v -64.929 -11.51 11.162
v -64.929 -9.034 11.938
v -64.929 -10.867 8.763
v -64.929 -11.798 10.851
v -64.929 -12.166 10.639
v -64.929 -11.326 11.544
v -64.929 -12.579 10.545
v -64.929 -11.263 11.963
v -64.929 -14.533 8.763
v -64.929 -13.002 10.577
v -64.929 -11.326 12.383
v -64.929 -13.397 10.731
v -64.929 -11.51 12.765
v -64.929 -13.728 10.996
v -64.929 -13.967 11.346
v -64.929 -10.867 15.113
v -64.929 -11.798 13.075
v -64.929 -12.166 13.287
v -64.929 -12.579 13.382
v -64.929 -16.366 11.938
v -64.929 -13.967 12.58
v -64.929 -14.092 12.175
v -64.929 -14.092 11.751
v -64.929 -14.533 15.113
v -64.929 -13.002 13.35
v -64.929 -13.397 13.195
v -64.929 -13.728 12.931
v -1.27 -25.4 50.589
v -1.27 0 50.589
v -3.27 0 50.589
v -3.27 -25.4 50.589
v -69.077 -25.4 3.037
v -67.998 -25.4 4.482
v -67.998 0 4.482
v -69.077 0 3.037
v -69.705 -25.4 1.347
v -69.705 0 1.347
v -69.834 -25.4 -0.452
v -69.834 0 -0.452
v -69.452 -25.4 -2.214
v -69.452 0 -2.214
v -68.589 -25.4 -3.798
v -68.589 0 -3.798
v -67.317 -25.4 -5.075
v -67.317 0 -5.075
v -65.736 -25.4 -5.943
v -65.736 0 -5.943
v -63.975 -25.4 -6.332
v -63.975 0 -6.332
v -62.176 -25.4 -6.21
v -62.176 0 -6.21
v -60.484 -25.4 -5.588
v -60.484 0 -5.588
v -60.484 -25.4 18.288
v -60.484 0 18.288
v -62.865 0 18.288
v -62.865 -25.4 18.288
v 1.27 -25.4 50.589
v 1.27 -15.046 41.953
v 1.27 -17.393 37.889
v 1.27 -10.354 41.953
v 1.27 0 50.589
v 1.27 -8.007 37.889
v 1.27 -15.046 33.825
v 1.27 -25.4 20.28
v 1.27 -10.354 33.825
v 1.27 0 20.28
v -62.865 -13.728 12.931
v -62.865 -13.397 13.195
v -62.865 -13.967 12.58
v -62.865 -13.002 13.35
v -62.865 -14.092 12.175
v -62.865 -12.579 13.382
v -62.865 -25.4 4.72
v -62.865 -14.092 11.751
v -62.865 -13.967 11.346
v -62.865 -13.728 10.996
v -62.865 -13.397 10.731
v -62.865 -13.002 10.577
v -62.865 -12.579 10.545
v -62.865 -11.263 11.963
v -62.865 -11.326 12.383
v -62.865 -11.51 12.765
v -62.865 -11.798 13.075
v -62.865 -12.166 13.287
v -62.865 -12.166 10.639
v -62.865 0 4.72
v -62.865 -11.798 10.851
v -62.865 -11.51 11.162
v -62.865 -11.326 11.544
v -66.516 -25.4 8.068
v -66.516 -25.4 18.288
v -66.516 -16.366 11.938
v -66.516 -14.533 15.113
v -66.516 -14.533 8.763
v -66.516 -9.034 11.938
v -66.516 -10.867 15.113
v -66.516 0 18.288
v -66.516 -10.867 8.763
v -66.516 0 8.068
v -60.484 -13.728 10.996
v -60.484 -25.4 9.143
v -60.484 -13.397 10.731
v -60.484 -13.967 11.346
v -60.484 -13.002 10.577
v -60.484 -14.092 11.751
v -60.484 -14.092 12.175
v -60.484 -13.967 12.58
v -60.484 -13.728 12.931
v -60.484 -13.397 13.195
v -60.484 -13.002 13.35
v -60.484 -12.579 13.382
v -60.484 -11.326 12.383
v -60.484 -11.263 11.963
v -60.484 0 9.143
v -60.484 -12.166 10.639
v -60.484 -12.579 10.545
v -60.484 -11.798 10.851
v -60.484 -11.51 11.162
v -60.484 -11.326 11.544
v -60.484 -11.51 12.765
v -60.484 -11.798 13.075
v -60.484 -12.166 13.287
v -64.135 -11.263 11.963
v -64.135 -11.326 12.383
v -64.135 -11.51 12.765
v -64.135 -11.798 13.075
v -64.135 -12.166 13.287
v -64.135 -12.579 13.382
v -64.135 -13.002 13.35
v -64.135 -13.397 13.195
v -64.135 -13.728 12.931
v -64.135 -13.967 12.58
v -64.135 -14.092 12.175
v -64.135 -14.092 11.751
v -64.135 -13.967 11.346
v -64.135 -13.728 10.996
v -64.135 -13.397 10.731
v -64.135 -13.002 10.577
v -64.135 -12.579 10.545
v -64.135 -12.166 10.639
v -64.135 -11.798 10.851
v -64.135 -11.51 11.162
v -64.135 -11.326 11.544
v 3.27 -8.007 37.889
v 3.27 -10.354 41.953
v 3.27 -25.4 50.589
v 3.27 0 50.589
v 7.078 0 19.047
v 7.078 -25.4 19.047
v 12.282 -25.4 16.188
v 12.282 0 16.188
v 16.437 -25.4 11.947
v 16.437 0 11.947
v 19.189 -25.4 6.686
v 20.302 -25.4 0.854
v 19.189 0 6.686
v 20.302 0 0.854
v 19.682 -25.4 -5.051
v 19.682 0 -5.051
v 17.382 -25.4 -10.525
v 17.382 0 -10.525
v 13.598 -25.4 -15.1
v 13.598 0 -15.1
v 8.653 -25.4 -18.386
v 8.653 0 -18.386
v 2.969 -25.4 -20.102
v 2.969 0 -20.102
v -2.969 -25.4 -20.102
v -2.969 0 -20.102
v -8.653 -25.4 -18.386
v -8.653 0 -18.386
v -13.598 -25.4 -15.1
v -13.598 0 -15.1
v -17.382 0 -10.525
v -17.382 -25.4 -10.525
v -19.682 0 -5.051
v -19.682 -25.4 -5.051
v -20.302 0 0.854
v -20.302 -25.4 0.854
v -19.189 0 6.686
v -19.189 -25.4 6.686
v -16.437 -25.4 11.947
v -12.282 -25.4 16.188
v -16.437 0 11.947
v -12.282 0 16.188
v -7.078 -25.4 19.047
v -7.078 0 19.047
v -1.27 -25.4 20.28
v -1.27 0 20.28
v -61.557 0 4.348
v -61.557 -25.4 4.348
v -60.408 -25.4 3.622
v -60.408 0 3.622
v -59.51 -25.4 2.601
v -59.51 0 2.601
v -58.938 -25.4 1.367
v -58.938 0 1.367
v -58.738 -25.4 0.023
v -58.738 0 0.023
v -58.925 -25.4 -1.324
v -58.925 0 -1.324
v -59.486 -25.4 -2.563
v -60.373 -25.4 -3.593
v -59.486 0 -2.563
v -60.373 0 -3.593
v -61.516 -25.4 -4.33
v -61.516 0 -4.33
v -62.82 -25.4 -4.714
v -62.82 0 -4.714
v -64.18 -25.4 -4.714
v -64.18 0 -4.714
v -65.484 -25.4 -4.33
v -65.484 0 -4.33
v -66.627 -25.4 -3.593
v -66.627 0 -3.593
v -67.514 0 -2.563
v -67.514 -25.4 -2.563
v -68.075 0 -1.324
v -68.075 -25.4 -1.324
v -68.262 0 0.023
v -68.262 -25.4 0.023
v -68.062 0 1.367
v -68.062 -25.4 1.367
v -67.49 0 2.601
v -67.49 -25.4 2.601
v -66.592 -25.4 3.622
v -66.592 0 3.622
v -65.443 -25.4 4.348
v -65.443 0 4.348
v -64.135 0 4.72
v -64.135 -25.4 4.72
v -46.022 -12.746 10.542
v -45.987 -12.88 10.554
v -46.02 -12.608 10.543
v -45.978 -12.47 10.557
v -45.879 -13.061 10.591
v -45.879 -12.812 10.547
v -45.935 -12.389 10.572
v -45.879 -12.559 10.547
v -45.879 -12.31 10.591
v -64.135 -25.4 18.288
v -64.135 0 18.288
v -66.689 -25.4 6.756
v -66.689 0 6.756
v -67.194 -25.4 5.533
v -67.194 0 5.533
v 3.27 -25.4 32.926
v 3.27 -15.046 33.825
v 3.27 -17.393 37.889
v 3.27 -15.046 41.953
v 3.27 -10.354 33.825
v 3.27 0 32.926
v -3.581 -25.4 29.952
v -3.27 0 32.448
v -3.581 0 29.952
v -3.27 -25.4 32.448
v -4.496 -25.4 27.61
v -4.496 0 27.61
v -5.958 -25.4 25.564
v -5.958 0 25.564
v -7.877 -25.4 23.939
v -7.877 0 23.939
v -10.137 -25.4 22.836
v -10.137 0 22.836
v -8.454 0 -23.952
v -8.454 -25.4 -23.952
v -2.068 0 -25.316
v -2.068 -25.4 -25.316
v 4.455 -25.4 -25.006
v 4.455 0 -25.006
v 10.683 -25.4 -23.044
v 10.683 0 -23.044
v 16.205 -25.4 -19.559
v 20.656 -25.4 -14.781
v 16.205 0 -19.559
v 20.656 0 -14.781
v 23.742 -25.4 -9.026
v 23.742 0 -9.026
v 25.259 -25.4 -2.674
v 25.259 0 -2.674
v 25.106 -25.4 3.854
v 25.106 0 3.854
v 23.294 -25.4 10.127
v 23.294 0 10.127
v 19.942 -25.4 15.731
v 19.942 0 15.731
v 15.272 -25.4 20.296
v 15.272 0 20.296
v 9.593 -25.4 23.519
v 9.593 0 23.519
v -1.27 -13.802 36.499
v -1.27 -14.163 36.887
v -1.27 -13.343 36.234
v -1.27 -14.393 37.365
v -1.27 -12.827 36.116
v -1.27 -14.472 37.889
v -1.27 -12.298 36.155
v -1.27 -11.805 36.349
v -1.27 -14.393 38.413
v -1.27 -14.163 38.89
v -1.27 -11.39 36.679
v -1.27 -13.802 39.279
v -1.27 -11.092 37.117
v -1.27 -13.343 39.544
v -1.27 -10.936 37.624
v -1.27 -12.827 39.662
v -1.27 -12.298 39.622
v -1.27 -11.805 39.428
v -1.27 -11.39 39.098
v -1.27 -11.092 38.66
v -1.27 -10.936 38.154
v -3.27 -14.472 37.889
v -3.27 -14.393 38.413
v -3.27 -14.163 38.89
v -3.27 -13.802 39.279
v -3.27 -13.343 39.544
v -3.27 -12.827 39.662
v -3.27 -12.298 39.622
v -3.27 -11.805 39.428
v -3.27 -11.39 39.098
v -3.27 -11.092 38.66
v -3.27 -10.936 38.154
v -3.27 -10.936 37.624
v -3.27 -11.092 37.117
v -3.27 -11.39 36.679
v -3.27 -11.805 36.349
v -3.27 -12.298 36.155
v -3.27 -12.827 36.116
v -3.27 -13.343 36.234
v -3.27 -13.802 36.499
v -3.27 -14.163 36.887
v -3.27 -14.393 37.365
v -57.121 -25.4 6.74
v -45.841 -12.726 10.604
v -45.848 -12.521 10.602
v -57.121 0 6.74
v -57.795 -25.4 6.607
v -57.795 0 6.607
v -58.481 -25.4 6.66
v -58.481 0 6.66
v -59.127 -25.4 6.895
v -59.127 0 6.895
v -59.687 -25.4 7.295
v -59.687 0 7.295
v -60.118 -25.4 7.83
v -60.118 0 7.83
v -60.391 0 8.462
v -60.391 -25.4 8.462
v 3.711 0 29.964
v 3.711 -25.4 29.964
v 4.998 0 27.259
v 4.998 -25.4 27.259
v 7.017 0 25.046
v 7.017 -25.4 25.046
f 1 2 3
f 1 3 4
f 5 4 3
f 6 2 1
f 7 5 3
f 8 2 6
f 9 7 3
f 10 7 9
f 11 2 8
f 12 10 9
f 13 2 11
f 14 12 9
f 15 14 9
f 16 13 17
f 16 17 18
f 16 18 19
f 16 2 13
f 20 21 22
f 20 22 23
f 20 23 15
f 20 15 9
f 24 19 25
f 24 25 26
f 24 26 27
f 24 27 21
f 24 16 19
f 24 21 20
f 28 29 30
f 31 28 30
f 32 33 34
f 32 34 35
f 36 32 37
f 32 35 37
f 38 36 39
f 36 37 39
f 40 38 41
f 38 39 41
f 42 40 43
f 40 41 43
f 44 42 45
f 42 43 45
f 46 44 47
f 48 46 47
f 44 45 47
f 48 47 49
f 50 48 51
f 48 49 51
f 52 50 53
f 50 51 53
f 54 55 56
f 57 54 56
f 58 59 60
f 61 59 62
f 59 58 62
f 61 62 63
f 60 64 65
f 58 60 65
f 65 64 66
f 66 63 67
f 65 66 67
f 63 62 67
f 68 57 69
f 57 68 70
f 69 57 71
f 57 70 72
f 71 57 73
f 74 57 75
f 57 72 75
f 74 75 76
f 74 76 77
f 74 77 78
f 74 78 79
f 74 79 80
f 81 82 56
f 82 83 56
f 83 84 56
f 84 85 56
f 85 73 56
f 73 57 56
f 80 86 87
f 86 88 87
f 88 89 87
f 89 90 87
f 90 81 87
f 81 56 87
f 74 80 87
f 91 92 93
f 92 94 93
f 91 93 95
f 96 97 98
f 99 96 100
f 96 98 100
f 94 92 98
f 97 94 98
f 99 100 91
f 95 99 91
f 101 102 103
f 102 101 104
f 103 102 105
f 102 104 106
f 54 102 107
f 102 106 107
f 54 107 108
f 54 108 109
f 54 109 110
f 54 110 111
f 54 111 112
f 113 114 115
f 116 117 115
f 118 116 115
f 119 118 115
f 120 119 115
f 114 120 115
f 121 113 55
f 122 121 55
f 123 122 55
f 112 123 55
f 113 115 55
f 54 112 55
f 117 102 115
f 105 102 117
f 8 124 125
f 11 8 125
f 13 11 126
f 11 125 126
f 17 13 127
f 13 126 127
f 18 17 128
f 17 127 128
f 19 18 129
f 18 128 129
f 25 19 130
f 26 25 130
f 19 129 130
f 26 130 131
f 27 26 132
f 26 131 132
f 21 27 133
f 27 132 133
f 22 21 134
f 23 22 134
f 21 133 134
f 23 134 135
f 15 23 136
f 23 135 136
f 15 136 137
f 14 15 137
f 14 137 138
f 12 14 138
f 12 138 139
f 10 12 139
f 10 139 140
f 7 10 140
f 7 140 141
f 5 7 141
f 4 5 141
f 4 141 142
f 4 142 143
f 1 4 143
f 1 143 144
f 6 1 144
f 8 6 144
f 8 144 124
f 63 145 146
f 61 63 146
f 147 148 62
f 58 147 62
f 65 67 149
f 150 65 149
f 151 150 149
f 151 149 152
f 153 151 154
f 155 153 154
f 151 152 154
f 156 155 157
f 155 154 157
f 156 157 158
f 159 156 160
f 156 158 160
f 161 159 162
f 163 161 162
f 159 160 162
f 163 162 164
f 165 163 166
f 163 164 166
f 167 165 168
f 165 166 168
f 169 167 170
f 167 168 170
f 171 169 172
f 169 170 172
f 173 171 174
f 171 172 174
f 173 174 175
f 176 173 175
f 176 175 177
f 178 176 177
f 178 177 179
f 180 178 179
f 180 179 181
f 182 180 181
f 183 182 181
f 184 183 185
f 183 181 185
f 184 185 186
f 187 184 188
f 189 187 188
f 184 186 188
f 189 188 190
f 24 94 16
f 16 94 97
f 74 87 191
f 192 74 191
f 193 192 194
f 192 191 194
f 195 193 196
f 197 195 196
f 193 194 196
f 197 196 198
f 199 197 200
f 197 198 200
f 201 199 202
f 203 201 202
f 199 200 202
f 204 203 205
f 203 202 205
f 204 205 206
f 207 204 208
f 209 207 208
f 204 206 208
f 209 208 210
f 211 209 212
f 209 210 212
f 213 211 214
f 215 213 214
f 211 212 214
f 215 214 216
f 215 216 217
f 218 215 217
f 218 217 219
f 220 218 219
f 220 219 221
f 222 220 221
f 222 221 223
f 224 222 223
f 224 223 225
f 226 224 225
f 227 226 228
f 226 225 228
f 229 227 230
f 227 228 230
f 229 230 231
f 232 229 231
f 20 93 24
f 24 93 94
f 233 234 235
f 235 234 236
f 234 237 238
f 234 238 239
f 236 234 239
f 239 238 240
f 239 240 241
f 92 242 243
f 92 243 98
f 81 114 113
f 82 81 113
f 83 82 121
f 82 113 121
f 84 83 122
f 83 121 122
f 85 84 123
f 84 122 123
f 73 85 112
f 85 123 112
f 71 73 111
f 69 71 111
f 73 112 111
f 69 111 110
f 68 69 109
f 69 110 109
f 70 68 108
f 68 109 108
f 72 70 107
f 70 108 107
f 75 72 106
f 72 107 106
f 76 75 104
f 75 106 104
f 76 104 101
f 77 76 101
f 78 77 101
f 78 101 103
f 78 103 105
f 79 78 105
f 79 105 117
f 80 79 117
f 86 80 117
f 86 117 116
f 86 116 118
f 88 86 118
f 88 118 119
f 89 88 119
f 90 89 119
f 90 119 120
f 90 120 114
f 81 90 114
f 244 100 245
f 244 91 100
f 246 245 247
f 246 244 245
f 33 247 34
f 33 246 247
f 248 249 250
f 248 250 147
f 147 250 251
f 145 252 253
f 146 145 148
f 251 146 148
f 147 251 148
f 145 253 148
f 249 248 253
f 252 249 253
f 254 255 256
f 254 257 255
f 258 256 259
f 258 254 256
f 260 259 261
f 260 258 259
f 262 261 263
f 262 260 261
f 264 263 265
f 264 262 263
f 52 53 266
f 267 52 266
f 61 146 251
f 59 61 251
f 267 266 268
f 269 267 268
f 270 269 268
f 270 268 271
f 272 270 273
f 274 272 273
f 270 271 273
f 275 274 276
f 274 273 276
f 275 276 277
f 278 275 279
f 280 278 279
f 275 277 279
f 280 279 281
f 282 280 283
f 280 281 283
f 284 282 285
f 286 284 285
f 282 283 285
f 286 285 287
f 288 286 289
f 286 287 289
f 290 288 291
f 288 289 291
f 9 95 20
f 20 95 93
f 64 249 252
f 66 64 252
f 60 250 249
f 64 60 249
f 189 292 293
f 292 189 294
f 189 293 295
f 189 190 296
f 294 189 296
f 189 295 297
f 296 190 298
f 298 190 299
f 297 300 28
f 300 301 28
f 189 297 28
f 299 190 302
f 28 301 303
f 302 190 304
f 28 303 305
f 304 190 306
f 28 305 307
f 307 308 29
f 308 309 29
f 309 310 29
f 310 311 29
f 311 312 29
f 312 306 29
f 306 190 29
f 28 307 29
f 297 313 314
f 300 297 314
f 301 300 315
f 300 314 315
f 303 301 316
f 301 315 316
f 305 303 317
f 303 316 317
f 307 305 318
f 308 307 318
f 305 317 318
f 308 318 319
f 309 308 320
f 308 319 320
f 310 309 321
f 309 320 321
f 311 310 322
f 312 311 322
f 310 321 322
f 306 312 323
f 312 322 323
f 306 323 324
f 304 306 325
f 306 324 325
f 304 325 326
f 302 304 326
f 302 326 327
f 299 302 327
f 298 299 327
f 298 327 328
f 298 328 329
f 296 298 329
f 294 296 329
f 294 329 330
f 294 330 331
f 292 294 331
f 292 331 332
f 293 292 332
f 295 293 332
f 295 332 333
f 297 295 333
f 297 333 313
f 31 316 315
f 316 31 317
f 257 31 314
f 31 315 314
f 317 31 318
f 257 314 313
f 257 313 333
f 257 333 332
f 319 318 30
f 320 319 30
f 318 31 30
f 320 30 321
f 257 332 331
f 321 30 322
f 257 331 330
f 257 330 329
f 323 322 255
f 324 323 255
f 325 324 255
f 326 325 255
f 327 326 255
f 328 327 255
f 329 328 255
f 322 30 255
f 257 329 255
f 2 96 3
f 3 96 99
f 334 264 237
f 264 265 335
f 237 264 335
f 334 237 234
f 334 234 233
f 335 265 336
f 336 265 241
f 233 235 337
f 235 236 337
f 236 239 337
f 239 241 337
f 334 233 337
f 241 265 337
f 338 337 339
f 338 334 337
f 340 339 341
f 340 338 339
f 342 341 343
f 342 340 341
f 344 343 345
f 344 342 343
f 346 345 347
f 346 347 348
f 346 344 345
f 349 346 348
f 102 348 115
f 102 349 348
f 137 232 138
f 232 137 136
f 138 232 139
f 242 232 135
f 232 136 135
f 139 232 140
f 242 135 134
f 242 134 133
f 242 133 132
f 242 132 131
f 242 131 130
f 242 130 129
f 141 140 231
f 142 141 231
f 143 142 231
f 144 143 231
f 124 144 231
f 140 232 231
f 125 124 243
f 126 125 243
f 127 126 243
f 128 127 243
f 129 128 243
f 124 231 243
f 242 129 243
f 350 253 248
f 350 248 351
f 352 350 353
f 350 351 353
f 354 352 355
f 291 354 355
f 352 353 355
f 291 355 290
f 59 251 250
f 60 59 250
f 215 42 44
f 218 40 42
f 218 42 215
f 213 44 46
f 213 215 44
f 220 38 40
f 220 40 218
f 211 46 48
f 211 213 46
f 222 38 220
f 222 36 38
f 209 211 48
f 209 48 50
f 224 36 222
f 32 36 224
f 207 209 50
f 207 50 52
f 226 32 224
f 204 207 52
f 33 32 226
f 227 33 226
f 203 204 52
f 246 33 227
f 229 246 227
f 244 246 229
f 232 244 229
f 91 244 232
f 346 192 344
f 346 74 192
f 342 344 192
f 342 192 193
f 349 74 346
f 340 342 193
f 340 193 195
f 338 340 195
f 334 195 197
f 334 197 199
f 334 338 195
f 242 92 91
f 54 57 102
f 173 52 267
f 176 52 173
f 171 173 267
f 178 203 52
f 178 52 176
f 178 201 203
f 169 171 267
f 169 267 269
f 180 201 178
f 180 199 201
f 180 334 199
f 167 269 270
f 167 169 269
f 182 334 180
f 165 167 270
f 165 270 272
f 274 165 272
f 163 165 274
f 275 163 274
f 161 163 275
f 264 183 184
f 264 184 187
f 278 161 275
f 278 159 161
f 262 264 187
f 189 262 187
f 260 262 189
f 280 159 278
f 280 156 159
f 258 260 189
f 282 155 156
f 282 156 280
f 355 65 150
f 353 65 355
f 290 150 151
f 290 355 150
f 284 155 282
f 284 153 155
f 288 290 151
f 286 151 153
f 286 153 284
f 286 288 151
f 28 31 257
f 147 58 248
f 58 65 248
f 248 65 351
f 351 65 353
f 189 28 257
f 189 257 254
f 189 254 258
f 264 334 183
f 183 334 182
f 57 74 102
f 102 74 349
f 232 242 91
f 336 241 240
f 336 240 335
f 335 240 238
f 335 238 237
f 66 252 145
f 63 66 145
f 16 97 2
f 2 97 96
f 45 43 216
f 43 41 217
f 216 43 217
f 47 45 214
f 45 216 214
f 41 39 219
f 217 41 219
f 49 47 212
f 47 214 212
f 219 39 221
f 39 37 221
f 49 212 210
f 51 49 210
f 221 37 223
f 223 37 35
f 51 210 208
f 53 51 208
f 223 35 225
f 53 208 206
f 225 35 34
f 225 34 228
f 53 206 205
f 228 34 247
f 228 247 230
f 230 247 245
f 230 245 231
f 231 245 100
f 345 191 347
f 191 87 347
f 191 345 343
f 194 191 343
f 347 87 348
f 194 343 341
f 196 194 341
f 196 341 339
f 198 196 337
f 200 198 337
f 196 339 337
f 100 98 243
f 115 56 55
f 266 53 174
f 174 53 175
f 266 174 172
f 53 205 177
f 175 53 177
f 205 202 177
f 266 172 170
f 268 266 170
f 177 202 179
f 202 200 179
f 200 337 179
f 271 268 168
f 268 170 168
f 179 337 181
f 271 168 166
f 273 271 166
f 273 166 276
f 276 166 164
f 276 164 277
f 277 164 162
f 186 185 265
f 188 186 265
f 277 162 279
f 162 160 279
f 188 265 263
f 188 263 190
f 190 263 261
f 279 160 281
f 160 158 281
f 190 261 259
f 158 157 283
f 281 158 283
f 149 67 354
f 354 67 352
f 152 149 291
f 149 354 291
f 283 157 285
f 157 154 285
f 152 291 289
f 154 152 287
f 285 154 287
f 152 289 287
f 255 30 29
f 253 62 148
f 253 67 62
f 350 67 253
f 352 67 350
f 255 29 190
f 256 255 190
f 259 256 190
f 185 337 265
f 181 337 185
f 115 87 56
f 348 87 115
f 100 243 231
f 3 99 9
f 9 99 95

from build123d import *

# Parameters (mm, degrees)
F1_DEPTH  = 25.4
F3_DEPTH  = 2.778125
F5_D      = 3.556
F7_DEPTH  = 1.5875
F9_R      = 10.16
F10_R     = 10.16
F11_R     = 2.54
F12_R     = 5.08
F13_D     = 2.8448
F13_DEPTH = 19.05
F13_TIP   = 0.8546641445


with BuildPart() as f1:
    # F0 (on Front) → F1 (new body)
    with BuildSketch(Plane.XZ):
        with BuildLine():
            Line((-3.269999937, 50.5886303798), (-3.269999937, 25.1886303798))
            Line((-3.269999937, 25.1886303798), (-12.8627581622, 21.9022704864))
            Line((-12.8627581622, 21.9022704864), (-60.48375, 5.5879098004))
            Line((-60.48375, 5.5879098004), (-60.48375, 18.2879098004))
            Line((-60.48375, 18.2879098004), (-62.865, 18.2879098004))
            Line((-62.865, 18.2879098004), (-62.865, 6.3181702256))
            Line((-62.865, 6.3181702256), (-62.865, 4.7199768273))
            ThreePointArc((-62.865, 4.7199768273), (-63.5, -4.7625), (-64.135, 4.7199768273))
            Line((-64.135, 4.7199768273), (-64.135, 6.3181702256))
            Line((-64.135, 6.3181702256), (-64.135, 18.2879098004))
            Line((-64.135, 18.2879098004), (-66.51625, 18.2879098004))
            Line((-66.51625, 18.2879098004), (-66.51625, 5.5879098004))
            ThreePointArc((-66.51625, 5.5879098004), (-69.0879098004, -3.01625), (-60.48375, -5.5879098004))
            Line((-60.48375, -5.5879098004), (-8.4538247205, -23.9518860968))
            ThreePointArc((-8.4538247205, -23.9518860968), (24.7065902088, -5.894438078), (3.269999937, 25.1886303798))
            Line((3.269999937, 25.1886303798), (3.269999937, 50.5886303798))
            Line((3.269999937, 50.5886303798), (1.27, 50.5886303798))
            Line((1.27, 50.5886303798), (1.27, 25.3682301314))
            Line((1.27, 25.3682301314), (1.27, 20.2802736668))
            ThreePointArc((1.27, 20.2802736668), (0, -20.32), (-1.27, 20.2802736668))
            Line((-1.27, 20.2802736668), (-1.27, 25.3682301314))
            Line((-1.27, 25.3682301314), (-1.27, 50.5886303798))
            Line((-1.27, 50.5886303798), (-3.269999937, 50.5886303798))
        make_face()
    extrude(amount=F1_DEPTH)

    # F2 (on face) → F3 (cut)
    with BuildSketch(Plane.YZ.offset(3.269999937)):
        Polygon((-10.353648506, 33.8246303798), (-8.007297012, 37.8886303798), (-10.353648506, 41.9526303798), (-15.046351494, 41.9526303798), (-17.392702988, 37.8886303798), (-15.046351494, 33.8246303798), align=None)
    extrude(amount=-F3_DEPTH, mode=Mode.SUBTRACT)

    # F5 (through all)
    with Locations(Plane.YZ.offset(3.269999937)):
        with Locations((-12.693702988, 37.8886303798)):
            Hole(F5_D / 2)

    # F6 (on face) → F7 (cut)
    with BuildSketch(Plane(origin=(-66.51625, 0, 0), x_dir=(0, -1, 0), z_dir=(-1, 0, 0))):
        Polygon((10.8669128953, 8.7629098004), (14.5330871047, 8.7629098004), (16.3661742094, 11.9379098004), (14.5330871047, 15.1129098004), (10.8669128953, 15.1129098004), (9.0338257906, 11.9379098004), align=None)
    extrude(amount=-F7_DEPTH, mode=Mode.SUBTRACT)

    # F9
    f9_edges = [f1.edges().sort_by_distance(p)[0] for p in [
        (-3.27, -12.7, 25.18863),
    ]]
    fillet(f9_edges, radius=F9_R)

    # F10
    f10_edges = [f1.edges().sort_by_distance(p)[0] for p in [
        (3.27, -12.7, 25.18863),
    ]]
    fillet(f10_edges, radius=F10_R)

    # F11
    f11_edges = [f1.edges().sort_by_distance(p)[0] for p in [
        (-60.48375, -12.7, 5.58791),
    ]]
    fillet(f11_edges, radius=F11_R)

    # F12
    f12_edges = [f1.edges().sort_by_distance(p)[0] for p in [
        (-66.51625, -12.7, 5.58791),
    ]]
    fillet(f12_edges, radius=F12_R)

    # F13
    with Locations(Plane(origin=(-64.92875, 0, 0), x_dir=(0, -1, 0), z_dir=(-1, 0, 0))):
        with Locations((12.6853353032, 11.9633098004)):
            Hole(F13_D / 2, depth=F13_DEPTH)
            with Locations((0, 0, -(F13_DEPTH + F13_TIP / 2))):  # 118° drill point
                Cone(0, F13_D / 2, F13_TIP, mode=Mode.SUBTRACT)


solid = f1.part
